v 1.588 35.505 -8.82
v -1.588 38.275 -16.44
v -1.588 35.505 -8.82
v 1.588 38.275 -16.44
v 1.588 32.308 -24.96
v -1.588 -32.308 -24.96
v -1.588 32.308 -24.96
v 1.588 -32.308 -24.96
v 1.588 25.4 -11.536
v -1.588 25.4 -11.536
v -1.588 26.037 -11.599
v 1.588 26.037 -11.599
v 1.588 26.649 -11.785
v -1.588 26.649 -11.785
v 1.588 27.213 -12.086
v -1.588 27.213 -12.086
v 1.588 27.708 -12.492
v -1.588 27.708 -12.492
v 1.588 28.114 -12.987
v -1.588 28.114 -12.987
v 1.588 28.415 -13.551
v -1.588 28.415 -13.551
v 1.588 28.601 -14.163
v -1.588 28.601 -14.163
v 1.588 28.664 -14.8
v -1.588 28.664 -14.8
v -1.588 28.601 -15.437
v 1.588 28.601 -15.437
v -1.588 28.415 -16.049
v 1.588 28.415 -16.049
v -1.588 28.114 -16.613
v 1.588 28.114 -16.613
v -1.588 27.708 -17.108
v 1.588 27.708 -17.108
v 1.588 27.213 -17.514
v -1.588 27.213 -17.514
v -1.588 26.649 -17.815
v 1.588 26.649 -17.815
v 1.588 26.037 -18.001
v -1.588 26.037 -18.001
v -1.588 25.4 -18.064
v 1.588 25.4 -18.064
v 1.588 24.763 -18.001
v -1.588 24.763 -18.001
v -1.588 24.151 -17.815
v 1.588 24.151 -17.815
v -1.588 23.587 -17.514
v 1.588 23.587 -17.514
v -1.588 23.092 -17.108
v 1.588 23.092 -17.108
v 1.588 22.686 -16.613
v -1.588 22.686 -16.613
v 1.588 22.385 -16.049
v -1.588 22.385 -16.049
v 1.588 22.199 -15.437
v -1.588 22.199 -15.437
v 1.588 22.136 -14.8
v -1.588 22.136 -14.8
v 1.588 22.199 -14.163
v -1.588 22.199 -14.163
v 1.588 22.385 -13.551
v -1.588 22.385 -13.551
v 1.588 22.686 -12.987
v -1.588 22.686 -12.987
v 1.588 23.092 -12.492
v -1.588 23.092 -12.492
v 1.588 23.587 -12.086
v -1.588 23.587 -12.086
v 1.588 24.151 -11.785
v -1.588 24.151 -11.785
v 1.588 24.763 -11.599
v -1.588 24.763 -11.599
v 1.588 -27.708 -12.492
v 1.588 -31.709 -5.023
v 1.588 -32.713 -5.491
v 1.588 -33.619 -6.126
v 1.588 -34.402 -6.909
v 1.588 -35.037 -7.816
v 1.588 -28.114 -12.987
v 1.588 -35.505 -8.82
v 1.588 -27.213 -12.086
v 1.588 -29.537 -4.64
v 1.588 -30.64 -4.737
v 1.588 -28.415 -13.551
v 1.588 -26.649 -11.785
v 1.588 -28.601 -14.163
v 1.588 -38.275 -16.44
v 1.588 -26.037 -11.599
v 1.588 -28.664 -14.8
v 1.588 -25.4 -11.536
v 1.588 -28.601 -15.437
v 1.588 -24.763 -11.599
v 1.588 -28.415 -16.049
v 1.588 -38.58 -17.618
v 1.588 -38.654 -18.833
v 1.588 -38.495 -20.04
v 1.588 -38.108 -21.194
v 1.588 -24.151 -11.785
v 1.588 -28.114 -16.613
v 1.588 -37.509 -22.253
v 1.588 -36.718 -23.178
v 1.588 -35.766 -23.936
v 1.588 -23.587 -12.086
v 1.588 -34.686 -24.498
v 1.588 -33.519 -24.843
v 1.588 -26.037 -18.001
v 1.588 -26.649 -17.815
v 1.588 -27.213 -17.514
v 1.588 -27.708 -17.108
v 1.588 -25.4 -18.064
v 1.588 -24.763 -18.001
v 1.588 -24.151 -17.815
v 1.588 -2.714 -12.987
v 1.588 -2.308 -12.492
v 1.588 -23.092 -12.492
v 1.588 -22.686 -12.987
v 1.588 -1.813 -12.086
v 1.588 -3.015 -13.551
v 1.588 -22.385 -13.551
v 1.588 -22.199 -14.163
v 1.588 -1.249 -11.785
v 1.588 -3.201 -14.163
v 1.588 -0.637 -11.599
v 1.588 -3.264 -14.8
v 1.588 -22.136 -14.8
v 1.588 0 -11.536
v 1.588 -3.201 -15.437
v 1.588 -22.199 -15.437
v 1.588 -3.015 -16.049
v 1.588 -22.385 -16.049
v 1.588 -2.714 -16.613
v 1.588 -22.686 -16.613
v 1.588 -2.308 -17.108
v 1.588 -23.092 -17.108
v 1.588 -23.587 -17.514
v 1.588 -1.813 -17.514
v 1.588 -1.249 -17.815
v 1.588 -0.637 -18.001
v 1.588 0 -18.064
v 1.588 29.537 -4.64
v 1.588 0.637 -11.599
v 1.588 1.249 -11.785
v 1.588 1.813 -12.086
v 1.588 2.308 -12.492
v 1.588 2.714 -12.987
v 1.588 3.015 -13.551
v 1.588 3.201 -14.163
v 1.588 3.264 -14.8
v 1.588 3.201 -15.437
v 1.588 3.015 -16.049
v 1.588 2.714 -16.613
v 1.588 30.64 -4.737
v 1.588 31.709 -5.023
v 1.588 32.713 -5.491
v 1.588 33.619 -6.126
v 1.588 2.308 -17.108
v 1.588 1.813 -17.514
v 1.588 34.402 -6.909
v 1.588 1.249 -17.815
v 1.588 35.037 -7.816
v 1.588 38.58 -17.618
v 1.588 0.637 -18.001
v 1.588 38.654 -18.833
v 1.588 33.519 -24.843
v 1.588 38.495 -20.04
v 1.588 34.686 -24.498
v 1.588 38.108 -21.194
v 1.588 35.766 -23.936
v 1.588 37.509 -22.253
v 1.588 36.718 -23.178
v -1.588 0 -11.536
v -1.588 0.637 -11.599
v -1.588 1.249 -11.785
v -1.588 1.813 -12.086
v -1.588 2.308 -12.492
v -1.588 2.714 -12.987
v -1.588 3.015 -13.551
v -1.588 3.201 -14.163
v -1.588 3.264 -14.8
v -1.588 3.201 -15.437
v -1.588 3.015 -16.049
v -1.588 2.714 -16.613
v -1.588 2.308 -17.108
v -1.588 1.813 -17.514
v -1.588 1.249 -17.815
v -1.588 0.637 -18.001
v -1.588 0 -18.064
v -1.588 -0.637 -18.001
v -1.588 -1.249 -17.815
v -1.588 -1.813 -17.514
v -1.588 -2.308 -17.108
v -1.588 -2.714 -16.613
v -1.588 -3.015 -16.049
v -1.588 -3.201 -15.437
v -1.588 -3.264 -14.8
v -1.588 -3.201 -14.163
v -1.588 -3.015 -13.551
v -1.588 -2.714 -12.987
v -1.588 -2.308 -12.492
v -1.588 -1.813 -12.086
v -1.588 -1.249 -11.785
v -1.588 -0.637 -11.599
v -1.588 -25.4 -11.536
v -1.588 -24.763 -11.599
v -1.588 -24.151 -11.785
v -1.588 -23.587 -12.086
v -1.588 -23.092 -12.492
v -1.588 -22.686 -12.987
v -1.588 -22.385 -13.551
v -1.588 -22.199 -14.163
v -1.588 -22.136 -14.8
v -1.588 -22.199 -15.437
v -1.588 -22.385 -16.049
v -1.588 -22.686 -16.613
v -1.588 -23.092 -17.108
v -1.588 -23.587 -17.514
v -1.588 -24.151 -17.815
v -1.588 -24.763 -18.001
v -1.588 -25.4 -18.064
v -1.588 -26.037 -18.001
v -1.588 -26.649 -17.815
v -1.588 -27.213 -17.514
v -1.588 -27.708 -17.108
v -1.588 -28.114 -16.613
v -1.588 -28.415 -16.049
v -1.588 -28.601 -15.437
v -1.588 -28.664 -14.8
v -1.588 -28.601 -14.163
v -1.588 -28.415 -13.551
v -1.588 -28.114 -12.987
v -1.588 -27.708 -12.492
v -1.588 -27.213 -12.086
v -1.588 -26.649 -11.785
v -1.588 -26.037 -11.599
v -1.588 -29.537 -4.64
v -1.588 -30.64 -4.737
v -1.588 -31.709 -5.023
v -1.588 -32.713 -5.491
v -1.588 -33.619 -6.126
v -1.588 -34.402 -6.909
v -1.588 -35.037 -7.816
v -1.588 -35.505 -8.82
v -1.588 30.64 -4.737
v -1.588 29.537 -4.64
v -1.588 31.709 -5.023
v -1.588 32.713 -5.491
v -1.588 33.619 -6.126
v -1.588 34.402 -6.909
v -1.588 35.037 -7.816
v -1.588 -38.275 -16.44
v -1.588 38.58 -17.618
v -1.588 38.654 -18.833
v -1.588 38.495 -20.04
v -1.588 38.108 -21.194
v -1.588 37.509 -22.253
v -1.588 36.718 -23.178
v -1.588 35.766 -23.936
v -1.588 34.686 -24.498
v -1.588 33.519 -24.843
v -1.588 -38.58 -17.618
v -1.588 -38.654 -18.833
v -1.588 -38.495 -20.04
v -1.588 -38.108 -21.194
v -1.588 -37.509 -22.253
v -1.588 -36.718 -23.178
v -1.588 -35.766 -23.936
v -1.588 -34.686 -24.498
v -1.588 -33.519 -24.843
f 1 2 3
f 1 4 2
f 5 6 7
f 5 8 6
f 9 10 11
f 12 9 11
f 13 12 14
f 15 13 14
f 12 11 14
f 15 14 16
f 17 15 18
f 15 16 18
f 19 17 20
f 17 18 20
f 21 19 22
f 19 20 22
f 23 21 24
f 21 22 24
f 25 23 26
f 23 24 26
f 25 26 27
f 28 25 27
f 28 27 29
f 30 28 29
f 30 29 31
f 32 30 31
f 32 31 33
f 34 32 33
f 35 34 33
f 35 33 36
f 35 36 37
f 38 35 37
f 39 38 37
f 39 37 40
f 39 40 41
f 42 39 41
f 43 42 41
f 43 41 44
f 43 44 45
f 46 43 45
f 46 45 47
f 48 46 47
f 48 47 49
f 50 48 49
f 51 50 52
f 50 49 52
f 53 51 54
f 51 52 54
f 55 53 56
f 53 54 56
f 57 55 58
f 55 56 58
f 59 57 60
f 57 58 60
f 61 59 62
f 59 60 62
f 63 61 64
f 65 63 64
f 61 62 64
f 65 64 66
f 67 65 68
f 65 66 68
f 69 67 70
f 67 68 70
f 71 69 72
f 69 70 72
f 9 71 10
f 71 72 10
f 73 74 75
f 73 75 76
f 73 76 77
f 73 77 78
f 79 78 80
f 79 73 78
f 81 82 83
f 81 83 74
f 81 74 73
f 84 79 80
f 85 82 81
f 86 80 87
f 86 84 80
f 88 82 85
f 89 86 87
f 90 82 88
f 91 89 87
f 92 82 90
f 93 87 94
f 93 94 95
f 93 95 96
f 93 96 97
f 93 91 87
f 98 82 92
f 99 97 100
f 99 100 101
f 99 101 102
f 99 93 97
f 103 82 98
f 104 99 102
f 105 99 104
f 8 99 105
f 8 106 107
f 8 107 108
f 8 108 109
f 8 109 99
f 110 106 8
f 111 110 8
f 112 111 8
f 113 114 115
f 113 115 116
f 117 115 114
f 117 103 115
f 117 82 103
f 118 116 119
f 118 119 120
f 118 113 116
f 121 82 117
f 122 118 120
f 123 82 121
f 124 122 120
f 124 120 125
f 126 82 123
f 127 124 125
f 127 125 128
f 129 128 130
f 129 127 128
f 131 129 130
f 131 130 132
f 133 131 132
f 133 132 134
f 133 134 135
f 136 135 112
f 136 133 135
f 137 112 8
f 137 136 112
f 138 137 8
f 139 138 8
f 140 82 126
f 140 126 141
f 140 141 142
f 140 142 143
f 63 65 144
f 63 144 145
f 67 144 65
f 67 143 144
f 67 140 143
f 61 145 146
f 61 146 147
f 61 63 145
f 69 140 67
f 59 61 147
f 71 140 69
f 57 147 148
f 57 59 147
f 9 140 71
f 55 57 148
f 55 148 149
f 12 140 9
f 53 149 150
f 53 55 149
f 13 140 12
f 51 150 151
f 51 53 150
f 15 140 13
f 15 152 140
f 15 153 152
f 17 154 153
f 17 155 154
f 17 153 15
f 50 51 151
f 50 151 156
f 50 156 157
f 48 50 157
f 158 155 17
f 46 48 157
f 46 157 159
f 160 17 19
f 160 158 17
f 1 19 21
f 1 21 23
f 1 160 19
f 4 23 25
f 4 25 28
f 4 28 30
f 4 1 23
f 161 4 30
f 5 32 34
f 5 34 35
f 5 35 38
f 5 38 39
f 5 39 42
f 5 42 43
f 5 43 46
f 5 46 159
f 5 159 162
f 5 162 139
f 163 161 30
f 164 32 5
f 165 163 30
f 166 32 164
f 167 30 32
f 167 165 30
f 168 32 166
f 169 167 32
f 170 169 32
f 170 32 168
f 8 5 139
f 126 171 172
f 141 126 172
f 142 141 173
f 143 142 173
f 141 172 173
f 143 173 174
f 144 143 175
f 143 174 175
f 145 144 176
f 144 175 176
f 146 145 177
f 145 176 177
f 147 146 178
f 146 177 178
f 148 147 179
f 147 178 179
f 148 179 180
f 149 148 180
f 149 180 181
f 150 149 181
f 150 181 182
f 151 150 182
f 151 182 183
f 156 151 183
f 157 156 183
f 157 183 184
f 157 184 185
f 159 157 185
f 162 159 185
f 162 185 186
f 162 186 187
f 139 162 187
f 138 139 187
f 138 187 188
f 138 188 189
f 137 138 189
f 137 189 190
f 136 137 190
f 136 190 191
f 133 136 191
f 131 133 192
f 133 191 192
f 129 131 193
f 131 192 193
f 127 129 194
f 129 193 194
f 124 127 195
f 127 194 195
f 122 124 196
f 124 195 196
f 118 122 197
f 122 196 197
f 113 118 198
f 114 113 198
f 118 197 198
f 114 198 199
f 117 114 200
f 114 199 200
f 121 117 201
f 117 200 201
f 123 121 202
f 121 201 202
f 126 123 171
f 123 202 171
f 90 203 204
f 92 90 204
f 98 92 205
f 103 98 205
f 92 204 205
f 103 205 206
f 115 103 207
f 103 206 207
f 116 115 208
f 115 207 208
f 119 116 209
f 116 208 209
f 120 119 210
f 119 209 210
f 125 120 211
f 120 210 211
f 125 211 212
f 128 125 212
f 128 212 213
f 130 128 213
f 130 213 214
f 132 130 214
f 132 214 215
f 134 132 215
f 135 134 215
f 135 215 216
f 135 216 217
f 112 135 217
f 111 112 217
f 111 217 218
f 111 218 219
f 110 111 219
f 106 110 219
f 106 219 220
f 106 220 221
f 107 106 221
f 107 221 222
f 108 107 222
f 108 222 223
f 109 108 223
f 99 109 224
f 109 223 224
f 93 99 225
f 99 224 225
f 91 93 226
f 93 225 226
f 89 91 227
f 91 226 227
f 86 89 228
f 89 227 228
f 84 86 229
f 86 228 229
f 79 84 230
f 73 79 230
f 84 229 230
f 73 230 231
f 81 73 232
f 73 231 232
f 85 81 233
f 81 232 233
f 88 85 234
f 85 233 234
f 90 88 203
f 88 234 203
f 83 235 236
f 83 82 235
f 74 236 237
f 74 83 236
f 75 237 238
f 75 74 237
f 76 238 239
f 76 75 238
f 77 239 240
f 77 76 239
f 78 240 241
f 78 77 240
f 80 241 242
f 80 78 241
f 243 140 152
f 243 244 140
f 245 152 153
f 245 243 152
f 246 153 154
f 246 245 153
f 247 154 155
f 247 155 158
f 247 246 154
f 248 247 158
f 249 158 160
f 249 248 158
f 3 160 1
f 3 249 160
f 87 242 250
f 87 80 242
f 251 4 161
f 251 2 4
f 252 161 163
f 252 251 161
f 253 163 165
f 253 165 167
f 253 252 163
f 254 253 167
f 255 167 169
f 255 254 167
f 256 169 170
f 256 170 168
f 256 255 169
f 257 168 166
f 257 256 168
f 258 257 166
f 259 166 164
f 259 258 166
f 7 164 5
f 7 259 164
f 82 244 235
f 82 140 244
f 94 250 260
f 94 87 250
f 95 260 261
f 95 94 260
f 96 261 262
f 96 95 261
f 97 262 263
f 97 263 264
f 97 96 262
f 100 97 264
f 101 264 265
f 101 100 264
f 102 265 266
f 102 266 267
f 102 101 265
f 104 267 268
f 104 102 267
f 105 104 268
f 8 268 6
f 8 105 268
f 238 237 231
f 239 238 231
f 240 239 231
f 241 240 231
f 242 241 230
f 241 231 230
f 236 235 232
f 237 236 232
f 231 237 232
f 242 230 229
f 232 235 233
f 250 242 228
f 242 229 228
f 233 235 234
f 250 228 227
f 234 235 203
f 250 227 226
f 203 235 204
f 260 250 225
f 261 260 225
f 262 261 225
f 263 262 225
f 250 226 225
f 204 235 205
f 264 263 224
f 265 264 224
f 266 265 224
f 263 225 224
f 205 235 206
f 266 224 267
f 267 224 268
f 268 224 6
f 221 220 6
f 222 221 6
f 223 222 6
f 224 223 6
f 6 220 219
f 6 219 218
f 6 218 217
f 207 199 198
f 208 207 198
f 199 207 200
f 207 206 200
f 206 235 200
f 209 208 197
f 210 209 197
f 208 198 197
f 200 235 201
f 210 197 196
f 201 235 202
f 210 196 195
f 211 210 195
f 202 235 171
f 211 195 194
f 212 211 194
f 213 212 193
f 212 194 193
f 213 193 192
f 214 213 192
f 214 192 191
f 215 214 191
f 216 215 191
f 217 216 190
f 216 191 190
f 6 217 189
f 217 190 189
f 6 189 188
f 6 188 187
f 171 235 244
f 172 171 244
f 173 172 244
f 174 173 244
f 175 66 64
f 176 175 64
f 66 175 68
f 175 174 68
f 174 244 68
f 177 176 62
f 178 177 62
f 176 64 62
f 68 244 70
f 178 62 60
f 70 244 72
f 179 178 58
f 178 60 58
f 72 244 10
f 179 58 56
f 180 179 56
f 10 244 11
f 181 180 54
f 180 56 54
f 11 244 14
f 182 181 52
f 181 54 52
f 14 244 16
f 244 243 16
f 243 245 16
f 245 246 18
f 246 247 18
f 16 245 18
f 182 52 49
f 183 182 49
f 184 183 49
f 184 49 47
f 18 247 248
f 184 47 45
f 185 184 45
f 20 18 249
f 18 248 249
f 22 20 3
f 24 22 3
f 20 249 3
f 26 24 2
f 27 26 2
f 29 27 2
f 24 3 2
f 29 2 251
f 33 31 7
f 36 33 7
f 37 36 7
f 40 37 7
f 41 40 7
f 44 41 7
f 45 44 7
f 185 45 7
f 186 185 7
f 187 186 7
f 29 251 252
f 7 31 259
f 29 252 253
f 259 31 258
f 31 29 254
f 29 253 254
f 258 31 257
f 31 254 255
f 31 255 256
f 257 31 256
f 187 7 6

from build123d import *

# Parameters (mm, degrees)
BOSS_EXTRUDE1_DEPTH     = 1.5875
F_1_4_CLEARANCE_HOLE1_D = 6.5278
FILLET1_R               = 6.35


with BuildPart() as part:
    # Sketch2 → Boss-Extrude1 (new, symmetric)
    with BuildSketch(Plane(origin=(0, 0, 0), x_dir=(0, 0, -1), z_dir=(1, 0, 0))):
        Polygon((4.639999991, 33.98455115), (4.639999991, -33.98455115), (24.959999991, -41.373642063), (24.959999991, 41.373642063), align=None)
    extrude(amount=BOSS_EXTRUDE1_DEPTH, both=True)

    # 1/4 Clearance Hole1 (through all)
    with Locations(Plane(origin=(1.5875, 0, 0), x_dir=(0, 0, -1), z_dir=(1, 0, 0))):
        with Locations((14.799999991, 0), (14.799999991, 25.4), (14.799999991, -25.4)):
            Hole(F_1_4_CLEARANCE_HOLE1_D / 2)

    # Fillet1
    fillet1_edges = [part.edges().sort_by_distance(p)[0] for p in [
        (0, 41.373642063, -24.959999991),
        (0, -41.373642063, -24.959999991),
        (0, -33.98455115, -4.639999991),
        (0, 33.98455115, -4.639999991),
    ]]
    fillet(fillet1_edges, radius=FILLET1_R)


solid = part.part
